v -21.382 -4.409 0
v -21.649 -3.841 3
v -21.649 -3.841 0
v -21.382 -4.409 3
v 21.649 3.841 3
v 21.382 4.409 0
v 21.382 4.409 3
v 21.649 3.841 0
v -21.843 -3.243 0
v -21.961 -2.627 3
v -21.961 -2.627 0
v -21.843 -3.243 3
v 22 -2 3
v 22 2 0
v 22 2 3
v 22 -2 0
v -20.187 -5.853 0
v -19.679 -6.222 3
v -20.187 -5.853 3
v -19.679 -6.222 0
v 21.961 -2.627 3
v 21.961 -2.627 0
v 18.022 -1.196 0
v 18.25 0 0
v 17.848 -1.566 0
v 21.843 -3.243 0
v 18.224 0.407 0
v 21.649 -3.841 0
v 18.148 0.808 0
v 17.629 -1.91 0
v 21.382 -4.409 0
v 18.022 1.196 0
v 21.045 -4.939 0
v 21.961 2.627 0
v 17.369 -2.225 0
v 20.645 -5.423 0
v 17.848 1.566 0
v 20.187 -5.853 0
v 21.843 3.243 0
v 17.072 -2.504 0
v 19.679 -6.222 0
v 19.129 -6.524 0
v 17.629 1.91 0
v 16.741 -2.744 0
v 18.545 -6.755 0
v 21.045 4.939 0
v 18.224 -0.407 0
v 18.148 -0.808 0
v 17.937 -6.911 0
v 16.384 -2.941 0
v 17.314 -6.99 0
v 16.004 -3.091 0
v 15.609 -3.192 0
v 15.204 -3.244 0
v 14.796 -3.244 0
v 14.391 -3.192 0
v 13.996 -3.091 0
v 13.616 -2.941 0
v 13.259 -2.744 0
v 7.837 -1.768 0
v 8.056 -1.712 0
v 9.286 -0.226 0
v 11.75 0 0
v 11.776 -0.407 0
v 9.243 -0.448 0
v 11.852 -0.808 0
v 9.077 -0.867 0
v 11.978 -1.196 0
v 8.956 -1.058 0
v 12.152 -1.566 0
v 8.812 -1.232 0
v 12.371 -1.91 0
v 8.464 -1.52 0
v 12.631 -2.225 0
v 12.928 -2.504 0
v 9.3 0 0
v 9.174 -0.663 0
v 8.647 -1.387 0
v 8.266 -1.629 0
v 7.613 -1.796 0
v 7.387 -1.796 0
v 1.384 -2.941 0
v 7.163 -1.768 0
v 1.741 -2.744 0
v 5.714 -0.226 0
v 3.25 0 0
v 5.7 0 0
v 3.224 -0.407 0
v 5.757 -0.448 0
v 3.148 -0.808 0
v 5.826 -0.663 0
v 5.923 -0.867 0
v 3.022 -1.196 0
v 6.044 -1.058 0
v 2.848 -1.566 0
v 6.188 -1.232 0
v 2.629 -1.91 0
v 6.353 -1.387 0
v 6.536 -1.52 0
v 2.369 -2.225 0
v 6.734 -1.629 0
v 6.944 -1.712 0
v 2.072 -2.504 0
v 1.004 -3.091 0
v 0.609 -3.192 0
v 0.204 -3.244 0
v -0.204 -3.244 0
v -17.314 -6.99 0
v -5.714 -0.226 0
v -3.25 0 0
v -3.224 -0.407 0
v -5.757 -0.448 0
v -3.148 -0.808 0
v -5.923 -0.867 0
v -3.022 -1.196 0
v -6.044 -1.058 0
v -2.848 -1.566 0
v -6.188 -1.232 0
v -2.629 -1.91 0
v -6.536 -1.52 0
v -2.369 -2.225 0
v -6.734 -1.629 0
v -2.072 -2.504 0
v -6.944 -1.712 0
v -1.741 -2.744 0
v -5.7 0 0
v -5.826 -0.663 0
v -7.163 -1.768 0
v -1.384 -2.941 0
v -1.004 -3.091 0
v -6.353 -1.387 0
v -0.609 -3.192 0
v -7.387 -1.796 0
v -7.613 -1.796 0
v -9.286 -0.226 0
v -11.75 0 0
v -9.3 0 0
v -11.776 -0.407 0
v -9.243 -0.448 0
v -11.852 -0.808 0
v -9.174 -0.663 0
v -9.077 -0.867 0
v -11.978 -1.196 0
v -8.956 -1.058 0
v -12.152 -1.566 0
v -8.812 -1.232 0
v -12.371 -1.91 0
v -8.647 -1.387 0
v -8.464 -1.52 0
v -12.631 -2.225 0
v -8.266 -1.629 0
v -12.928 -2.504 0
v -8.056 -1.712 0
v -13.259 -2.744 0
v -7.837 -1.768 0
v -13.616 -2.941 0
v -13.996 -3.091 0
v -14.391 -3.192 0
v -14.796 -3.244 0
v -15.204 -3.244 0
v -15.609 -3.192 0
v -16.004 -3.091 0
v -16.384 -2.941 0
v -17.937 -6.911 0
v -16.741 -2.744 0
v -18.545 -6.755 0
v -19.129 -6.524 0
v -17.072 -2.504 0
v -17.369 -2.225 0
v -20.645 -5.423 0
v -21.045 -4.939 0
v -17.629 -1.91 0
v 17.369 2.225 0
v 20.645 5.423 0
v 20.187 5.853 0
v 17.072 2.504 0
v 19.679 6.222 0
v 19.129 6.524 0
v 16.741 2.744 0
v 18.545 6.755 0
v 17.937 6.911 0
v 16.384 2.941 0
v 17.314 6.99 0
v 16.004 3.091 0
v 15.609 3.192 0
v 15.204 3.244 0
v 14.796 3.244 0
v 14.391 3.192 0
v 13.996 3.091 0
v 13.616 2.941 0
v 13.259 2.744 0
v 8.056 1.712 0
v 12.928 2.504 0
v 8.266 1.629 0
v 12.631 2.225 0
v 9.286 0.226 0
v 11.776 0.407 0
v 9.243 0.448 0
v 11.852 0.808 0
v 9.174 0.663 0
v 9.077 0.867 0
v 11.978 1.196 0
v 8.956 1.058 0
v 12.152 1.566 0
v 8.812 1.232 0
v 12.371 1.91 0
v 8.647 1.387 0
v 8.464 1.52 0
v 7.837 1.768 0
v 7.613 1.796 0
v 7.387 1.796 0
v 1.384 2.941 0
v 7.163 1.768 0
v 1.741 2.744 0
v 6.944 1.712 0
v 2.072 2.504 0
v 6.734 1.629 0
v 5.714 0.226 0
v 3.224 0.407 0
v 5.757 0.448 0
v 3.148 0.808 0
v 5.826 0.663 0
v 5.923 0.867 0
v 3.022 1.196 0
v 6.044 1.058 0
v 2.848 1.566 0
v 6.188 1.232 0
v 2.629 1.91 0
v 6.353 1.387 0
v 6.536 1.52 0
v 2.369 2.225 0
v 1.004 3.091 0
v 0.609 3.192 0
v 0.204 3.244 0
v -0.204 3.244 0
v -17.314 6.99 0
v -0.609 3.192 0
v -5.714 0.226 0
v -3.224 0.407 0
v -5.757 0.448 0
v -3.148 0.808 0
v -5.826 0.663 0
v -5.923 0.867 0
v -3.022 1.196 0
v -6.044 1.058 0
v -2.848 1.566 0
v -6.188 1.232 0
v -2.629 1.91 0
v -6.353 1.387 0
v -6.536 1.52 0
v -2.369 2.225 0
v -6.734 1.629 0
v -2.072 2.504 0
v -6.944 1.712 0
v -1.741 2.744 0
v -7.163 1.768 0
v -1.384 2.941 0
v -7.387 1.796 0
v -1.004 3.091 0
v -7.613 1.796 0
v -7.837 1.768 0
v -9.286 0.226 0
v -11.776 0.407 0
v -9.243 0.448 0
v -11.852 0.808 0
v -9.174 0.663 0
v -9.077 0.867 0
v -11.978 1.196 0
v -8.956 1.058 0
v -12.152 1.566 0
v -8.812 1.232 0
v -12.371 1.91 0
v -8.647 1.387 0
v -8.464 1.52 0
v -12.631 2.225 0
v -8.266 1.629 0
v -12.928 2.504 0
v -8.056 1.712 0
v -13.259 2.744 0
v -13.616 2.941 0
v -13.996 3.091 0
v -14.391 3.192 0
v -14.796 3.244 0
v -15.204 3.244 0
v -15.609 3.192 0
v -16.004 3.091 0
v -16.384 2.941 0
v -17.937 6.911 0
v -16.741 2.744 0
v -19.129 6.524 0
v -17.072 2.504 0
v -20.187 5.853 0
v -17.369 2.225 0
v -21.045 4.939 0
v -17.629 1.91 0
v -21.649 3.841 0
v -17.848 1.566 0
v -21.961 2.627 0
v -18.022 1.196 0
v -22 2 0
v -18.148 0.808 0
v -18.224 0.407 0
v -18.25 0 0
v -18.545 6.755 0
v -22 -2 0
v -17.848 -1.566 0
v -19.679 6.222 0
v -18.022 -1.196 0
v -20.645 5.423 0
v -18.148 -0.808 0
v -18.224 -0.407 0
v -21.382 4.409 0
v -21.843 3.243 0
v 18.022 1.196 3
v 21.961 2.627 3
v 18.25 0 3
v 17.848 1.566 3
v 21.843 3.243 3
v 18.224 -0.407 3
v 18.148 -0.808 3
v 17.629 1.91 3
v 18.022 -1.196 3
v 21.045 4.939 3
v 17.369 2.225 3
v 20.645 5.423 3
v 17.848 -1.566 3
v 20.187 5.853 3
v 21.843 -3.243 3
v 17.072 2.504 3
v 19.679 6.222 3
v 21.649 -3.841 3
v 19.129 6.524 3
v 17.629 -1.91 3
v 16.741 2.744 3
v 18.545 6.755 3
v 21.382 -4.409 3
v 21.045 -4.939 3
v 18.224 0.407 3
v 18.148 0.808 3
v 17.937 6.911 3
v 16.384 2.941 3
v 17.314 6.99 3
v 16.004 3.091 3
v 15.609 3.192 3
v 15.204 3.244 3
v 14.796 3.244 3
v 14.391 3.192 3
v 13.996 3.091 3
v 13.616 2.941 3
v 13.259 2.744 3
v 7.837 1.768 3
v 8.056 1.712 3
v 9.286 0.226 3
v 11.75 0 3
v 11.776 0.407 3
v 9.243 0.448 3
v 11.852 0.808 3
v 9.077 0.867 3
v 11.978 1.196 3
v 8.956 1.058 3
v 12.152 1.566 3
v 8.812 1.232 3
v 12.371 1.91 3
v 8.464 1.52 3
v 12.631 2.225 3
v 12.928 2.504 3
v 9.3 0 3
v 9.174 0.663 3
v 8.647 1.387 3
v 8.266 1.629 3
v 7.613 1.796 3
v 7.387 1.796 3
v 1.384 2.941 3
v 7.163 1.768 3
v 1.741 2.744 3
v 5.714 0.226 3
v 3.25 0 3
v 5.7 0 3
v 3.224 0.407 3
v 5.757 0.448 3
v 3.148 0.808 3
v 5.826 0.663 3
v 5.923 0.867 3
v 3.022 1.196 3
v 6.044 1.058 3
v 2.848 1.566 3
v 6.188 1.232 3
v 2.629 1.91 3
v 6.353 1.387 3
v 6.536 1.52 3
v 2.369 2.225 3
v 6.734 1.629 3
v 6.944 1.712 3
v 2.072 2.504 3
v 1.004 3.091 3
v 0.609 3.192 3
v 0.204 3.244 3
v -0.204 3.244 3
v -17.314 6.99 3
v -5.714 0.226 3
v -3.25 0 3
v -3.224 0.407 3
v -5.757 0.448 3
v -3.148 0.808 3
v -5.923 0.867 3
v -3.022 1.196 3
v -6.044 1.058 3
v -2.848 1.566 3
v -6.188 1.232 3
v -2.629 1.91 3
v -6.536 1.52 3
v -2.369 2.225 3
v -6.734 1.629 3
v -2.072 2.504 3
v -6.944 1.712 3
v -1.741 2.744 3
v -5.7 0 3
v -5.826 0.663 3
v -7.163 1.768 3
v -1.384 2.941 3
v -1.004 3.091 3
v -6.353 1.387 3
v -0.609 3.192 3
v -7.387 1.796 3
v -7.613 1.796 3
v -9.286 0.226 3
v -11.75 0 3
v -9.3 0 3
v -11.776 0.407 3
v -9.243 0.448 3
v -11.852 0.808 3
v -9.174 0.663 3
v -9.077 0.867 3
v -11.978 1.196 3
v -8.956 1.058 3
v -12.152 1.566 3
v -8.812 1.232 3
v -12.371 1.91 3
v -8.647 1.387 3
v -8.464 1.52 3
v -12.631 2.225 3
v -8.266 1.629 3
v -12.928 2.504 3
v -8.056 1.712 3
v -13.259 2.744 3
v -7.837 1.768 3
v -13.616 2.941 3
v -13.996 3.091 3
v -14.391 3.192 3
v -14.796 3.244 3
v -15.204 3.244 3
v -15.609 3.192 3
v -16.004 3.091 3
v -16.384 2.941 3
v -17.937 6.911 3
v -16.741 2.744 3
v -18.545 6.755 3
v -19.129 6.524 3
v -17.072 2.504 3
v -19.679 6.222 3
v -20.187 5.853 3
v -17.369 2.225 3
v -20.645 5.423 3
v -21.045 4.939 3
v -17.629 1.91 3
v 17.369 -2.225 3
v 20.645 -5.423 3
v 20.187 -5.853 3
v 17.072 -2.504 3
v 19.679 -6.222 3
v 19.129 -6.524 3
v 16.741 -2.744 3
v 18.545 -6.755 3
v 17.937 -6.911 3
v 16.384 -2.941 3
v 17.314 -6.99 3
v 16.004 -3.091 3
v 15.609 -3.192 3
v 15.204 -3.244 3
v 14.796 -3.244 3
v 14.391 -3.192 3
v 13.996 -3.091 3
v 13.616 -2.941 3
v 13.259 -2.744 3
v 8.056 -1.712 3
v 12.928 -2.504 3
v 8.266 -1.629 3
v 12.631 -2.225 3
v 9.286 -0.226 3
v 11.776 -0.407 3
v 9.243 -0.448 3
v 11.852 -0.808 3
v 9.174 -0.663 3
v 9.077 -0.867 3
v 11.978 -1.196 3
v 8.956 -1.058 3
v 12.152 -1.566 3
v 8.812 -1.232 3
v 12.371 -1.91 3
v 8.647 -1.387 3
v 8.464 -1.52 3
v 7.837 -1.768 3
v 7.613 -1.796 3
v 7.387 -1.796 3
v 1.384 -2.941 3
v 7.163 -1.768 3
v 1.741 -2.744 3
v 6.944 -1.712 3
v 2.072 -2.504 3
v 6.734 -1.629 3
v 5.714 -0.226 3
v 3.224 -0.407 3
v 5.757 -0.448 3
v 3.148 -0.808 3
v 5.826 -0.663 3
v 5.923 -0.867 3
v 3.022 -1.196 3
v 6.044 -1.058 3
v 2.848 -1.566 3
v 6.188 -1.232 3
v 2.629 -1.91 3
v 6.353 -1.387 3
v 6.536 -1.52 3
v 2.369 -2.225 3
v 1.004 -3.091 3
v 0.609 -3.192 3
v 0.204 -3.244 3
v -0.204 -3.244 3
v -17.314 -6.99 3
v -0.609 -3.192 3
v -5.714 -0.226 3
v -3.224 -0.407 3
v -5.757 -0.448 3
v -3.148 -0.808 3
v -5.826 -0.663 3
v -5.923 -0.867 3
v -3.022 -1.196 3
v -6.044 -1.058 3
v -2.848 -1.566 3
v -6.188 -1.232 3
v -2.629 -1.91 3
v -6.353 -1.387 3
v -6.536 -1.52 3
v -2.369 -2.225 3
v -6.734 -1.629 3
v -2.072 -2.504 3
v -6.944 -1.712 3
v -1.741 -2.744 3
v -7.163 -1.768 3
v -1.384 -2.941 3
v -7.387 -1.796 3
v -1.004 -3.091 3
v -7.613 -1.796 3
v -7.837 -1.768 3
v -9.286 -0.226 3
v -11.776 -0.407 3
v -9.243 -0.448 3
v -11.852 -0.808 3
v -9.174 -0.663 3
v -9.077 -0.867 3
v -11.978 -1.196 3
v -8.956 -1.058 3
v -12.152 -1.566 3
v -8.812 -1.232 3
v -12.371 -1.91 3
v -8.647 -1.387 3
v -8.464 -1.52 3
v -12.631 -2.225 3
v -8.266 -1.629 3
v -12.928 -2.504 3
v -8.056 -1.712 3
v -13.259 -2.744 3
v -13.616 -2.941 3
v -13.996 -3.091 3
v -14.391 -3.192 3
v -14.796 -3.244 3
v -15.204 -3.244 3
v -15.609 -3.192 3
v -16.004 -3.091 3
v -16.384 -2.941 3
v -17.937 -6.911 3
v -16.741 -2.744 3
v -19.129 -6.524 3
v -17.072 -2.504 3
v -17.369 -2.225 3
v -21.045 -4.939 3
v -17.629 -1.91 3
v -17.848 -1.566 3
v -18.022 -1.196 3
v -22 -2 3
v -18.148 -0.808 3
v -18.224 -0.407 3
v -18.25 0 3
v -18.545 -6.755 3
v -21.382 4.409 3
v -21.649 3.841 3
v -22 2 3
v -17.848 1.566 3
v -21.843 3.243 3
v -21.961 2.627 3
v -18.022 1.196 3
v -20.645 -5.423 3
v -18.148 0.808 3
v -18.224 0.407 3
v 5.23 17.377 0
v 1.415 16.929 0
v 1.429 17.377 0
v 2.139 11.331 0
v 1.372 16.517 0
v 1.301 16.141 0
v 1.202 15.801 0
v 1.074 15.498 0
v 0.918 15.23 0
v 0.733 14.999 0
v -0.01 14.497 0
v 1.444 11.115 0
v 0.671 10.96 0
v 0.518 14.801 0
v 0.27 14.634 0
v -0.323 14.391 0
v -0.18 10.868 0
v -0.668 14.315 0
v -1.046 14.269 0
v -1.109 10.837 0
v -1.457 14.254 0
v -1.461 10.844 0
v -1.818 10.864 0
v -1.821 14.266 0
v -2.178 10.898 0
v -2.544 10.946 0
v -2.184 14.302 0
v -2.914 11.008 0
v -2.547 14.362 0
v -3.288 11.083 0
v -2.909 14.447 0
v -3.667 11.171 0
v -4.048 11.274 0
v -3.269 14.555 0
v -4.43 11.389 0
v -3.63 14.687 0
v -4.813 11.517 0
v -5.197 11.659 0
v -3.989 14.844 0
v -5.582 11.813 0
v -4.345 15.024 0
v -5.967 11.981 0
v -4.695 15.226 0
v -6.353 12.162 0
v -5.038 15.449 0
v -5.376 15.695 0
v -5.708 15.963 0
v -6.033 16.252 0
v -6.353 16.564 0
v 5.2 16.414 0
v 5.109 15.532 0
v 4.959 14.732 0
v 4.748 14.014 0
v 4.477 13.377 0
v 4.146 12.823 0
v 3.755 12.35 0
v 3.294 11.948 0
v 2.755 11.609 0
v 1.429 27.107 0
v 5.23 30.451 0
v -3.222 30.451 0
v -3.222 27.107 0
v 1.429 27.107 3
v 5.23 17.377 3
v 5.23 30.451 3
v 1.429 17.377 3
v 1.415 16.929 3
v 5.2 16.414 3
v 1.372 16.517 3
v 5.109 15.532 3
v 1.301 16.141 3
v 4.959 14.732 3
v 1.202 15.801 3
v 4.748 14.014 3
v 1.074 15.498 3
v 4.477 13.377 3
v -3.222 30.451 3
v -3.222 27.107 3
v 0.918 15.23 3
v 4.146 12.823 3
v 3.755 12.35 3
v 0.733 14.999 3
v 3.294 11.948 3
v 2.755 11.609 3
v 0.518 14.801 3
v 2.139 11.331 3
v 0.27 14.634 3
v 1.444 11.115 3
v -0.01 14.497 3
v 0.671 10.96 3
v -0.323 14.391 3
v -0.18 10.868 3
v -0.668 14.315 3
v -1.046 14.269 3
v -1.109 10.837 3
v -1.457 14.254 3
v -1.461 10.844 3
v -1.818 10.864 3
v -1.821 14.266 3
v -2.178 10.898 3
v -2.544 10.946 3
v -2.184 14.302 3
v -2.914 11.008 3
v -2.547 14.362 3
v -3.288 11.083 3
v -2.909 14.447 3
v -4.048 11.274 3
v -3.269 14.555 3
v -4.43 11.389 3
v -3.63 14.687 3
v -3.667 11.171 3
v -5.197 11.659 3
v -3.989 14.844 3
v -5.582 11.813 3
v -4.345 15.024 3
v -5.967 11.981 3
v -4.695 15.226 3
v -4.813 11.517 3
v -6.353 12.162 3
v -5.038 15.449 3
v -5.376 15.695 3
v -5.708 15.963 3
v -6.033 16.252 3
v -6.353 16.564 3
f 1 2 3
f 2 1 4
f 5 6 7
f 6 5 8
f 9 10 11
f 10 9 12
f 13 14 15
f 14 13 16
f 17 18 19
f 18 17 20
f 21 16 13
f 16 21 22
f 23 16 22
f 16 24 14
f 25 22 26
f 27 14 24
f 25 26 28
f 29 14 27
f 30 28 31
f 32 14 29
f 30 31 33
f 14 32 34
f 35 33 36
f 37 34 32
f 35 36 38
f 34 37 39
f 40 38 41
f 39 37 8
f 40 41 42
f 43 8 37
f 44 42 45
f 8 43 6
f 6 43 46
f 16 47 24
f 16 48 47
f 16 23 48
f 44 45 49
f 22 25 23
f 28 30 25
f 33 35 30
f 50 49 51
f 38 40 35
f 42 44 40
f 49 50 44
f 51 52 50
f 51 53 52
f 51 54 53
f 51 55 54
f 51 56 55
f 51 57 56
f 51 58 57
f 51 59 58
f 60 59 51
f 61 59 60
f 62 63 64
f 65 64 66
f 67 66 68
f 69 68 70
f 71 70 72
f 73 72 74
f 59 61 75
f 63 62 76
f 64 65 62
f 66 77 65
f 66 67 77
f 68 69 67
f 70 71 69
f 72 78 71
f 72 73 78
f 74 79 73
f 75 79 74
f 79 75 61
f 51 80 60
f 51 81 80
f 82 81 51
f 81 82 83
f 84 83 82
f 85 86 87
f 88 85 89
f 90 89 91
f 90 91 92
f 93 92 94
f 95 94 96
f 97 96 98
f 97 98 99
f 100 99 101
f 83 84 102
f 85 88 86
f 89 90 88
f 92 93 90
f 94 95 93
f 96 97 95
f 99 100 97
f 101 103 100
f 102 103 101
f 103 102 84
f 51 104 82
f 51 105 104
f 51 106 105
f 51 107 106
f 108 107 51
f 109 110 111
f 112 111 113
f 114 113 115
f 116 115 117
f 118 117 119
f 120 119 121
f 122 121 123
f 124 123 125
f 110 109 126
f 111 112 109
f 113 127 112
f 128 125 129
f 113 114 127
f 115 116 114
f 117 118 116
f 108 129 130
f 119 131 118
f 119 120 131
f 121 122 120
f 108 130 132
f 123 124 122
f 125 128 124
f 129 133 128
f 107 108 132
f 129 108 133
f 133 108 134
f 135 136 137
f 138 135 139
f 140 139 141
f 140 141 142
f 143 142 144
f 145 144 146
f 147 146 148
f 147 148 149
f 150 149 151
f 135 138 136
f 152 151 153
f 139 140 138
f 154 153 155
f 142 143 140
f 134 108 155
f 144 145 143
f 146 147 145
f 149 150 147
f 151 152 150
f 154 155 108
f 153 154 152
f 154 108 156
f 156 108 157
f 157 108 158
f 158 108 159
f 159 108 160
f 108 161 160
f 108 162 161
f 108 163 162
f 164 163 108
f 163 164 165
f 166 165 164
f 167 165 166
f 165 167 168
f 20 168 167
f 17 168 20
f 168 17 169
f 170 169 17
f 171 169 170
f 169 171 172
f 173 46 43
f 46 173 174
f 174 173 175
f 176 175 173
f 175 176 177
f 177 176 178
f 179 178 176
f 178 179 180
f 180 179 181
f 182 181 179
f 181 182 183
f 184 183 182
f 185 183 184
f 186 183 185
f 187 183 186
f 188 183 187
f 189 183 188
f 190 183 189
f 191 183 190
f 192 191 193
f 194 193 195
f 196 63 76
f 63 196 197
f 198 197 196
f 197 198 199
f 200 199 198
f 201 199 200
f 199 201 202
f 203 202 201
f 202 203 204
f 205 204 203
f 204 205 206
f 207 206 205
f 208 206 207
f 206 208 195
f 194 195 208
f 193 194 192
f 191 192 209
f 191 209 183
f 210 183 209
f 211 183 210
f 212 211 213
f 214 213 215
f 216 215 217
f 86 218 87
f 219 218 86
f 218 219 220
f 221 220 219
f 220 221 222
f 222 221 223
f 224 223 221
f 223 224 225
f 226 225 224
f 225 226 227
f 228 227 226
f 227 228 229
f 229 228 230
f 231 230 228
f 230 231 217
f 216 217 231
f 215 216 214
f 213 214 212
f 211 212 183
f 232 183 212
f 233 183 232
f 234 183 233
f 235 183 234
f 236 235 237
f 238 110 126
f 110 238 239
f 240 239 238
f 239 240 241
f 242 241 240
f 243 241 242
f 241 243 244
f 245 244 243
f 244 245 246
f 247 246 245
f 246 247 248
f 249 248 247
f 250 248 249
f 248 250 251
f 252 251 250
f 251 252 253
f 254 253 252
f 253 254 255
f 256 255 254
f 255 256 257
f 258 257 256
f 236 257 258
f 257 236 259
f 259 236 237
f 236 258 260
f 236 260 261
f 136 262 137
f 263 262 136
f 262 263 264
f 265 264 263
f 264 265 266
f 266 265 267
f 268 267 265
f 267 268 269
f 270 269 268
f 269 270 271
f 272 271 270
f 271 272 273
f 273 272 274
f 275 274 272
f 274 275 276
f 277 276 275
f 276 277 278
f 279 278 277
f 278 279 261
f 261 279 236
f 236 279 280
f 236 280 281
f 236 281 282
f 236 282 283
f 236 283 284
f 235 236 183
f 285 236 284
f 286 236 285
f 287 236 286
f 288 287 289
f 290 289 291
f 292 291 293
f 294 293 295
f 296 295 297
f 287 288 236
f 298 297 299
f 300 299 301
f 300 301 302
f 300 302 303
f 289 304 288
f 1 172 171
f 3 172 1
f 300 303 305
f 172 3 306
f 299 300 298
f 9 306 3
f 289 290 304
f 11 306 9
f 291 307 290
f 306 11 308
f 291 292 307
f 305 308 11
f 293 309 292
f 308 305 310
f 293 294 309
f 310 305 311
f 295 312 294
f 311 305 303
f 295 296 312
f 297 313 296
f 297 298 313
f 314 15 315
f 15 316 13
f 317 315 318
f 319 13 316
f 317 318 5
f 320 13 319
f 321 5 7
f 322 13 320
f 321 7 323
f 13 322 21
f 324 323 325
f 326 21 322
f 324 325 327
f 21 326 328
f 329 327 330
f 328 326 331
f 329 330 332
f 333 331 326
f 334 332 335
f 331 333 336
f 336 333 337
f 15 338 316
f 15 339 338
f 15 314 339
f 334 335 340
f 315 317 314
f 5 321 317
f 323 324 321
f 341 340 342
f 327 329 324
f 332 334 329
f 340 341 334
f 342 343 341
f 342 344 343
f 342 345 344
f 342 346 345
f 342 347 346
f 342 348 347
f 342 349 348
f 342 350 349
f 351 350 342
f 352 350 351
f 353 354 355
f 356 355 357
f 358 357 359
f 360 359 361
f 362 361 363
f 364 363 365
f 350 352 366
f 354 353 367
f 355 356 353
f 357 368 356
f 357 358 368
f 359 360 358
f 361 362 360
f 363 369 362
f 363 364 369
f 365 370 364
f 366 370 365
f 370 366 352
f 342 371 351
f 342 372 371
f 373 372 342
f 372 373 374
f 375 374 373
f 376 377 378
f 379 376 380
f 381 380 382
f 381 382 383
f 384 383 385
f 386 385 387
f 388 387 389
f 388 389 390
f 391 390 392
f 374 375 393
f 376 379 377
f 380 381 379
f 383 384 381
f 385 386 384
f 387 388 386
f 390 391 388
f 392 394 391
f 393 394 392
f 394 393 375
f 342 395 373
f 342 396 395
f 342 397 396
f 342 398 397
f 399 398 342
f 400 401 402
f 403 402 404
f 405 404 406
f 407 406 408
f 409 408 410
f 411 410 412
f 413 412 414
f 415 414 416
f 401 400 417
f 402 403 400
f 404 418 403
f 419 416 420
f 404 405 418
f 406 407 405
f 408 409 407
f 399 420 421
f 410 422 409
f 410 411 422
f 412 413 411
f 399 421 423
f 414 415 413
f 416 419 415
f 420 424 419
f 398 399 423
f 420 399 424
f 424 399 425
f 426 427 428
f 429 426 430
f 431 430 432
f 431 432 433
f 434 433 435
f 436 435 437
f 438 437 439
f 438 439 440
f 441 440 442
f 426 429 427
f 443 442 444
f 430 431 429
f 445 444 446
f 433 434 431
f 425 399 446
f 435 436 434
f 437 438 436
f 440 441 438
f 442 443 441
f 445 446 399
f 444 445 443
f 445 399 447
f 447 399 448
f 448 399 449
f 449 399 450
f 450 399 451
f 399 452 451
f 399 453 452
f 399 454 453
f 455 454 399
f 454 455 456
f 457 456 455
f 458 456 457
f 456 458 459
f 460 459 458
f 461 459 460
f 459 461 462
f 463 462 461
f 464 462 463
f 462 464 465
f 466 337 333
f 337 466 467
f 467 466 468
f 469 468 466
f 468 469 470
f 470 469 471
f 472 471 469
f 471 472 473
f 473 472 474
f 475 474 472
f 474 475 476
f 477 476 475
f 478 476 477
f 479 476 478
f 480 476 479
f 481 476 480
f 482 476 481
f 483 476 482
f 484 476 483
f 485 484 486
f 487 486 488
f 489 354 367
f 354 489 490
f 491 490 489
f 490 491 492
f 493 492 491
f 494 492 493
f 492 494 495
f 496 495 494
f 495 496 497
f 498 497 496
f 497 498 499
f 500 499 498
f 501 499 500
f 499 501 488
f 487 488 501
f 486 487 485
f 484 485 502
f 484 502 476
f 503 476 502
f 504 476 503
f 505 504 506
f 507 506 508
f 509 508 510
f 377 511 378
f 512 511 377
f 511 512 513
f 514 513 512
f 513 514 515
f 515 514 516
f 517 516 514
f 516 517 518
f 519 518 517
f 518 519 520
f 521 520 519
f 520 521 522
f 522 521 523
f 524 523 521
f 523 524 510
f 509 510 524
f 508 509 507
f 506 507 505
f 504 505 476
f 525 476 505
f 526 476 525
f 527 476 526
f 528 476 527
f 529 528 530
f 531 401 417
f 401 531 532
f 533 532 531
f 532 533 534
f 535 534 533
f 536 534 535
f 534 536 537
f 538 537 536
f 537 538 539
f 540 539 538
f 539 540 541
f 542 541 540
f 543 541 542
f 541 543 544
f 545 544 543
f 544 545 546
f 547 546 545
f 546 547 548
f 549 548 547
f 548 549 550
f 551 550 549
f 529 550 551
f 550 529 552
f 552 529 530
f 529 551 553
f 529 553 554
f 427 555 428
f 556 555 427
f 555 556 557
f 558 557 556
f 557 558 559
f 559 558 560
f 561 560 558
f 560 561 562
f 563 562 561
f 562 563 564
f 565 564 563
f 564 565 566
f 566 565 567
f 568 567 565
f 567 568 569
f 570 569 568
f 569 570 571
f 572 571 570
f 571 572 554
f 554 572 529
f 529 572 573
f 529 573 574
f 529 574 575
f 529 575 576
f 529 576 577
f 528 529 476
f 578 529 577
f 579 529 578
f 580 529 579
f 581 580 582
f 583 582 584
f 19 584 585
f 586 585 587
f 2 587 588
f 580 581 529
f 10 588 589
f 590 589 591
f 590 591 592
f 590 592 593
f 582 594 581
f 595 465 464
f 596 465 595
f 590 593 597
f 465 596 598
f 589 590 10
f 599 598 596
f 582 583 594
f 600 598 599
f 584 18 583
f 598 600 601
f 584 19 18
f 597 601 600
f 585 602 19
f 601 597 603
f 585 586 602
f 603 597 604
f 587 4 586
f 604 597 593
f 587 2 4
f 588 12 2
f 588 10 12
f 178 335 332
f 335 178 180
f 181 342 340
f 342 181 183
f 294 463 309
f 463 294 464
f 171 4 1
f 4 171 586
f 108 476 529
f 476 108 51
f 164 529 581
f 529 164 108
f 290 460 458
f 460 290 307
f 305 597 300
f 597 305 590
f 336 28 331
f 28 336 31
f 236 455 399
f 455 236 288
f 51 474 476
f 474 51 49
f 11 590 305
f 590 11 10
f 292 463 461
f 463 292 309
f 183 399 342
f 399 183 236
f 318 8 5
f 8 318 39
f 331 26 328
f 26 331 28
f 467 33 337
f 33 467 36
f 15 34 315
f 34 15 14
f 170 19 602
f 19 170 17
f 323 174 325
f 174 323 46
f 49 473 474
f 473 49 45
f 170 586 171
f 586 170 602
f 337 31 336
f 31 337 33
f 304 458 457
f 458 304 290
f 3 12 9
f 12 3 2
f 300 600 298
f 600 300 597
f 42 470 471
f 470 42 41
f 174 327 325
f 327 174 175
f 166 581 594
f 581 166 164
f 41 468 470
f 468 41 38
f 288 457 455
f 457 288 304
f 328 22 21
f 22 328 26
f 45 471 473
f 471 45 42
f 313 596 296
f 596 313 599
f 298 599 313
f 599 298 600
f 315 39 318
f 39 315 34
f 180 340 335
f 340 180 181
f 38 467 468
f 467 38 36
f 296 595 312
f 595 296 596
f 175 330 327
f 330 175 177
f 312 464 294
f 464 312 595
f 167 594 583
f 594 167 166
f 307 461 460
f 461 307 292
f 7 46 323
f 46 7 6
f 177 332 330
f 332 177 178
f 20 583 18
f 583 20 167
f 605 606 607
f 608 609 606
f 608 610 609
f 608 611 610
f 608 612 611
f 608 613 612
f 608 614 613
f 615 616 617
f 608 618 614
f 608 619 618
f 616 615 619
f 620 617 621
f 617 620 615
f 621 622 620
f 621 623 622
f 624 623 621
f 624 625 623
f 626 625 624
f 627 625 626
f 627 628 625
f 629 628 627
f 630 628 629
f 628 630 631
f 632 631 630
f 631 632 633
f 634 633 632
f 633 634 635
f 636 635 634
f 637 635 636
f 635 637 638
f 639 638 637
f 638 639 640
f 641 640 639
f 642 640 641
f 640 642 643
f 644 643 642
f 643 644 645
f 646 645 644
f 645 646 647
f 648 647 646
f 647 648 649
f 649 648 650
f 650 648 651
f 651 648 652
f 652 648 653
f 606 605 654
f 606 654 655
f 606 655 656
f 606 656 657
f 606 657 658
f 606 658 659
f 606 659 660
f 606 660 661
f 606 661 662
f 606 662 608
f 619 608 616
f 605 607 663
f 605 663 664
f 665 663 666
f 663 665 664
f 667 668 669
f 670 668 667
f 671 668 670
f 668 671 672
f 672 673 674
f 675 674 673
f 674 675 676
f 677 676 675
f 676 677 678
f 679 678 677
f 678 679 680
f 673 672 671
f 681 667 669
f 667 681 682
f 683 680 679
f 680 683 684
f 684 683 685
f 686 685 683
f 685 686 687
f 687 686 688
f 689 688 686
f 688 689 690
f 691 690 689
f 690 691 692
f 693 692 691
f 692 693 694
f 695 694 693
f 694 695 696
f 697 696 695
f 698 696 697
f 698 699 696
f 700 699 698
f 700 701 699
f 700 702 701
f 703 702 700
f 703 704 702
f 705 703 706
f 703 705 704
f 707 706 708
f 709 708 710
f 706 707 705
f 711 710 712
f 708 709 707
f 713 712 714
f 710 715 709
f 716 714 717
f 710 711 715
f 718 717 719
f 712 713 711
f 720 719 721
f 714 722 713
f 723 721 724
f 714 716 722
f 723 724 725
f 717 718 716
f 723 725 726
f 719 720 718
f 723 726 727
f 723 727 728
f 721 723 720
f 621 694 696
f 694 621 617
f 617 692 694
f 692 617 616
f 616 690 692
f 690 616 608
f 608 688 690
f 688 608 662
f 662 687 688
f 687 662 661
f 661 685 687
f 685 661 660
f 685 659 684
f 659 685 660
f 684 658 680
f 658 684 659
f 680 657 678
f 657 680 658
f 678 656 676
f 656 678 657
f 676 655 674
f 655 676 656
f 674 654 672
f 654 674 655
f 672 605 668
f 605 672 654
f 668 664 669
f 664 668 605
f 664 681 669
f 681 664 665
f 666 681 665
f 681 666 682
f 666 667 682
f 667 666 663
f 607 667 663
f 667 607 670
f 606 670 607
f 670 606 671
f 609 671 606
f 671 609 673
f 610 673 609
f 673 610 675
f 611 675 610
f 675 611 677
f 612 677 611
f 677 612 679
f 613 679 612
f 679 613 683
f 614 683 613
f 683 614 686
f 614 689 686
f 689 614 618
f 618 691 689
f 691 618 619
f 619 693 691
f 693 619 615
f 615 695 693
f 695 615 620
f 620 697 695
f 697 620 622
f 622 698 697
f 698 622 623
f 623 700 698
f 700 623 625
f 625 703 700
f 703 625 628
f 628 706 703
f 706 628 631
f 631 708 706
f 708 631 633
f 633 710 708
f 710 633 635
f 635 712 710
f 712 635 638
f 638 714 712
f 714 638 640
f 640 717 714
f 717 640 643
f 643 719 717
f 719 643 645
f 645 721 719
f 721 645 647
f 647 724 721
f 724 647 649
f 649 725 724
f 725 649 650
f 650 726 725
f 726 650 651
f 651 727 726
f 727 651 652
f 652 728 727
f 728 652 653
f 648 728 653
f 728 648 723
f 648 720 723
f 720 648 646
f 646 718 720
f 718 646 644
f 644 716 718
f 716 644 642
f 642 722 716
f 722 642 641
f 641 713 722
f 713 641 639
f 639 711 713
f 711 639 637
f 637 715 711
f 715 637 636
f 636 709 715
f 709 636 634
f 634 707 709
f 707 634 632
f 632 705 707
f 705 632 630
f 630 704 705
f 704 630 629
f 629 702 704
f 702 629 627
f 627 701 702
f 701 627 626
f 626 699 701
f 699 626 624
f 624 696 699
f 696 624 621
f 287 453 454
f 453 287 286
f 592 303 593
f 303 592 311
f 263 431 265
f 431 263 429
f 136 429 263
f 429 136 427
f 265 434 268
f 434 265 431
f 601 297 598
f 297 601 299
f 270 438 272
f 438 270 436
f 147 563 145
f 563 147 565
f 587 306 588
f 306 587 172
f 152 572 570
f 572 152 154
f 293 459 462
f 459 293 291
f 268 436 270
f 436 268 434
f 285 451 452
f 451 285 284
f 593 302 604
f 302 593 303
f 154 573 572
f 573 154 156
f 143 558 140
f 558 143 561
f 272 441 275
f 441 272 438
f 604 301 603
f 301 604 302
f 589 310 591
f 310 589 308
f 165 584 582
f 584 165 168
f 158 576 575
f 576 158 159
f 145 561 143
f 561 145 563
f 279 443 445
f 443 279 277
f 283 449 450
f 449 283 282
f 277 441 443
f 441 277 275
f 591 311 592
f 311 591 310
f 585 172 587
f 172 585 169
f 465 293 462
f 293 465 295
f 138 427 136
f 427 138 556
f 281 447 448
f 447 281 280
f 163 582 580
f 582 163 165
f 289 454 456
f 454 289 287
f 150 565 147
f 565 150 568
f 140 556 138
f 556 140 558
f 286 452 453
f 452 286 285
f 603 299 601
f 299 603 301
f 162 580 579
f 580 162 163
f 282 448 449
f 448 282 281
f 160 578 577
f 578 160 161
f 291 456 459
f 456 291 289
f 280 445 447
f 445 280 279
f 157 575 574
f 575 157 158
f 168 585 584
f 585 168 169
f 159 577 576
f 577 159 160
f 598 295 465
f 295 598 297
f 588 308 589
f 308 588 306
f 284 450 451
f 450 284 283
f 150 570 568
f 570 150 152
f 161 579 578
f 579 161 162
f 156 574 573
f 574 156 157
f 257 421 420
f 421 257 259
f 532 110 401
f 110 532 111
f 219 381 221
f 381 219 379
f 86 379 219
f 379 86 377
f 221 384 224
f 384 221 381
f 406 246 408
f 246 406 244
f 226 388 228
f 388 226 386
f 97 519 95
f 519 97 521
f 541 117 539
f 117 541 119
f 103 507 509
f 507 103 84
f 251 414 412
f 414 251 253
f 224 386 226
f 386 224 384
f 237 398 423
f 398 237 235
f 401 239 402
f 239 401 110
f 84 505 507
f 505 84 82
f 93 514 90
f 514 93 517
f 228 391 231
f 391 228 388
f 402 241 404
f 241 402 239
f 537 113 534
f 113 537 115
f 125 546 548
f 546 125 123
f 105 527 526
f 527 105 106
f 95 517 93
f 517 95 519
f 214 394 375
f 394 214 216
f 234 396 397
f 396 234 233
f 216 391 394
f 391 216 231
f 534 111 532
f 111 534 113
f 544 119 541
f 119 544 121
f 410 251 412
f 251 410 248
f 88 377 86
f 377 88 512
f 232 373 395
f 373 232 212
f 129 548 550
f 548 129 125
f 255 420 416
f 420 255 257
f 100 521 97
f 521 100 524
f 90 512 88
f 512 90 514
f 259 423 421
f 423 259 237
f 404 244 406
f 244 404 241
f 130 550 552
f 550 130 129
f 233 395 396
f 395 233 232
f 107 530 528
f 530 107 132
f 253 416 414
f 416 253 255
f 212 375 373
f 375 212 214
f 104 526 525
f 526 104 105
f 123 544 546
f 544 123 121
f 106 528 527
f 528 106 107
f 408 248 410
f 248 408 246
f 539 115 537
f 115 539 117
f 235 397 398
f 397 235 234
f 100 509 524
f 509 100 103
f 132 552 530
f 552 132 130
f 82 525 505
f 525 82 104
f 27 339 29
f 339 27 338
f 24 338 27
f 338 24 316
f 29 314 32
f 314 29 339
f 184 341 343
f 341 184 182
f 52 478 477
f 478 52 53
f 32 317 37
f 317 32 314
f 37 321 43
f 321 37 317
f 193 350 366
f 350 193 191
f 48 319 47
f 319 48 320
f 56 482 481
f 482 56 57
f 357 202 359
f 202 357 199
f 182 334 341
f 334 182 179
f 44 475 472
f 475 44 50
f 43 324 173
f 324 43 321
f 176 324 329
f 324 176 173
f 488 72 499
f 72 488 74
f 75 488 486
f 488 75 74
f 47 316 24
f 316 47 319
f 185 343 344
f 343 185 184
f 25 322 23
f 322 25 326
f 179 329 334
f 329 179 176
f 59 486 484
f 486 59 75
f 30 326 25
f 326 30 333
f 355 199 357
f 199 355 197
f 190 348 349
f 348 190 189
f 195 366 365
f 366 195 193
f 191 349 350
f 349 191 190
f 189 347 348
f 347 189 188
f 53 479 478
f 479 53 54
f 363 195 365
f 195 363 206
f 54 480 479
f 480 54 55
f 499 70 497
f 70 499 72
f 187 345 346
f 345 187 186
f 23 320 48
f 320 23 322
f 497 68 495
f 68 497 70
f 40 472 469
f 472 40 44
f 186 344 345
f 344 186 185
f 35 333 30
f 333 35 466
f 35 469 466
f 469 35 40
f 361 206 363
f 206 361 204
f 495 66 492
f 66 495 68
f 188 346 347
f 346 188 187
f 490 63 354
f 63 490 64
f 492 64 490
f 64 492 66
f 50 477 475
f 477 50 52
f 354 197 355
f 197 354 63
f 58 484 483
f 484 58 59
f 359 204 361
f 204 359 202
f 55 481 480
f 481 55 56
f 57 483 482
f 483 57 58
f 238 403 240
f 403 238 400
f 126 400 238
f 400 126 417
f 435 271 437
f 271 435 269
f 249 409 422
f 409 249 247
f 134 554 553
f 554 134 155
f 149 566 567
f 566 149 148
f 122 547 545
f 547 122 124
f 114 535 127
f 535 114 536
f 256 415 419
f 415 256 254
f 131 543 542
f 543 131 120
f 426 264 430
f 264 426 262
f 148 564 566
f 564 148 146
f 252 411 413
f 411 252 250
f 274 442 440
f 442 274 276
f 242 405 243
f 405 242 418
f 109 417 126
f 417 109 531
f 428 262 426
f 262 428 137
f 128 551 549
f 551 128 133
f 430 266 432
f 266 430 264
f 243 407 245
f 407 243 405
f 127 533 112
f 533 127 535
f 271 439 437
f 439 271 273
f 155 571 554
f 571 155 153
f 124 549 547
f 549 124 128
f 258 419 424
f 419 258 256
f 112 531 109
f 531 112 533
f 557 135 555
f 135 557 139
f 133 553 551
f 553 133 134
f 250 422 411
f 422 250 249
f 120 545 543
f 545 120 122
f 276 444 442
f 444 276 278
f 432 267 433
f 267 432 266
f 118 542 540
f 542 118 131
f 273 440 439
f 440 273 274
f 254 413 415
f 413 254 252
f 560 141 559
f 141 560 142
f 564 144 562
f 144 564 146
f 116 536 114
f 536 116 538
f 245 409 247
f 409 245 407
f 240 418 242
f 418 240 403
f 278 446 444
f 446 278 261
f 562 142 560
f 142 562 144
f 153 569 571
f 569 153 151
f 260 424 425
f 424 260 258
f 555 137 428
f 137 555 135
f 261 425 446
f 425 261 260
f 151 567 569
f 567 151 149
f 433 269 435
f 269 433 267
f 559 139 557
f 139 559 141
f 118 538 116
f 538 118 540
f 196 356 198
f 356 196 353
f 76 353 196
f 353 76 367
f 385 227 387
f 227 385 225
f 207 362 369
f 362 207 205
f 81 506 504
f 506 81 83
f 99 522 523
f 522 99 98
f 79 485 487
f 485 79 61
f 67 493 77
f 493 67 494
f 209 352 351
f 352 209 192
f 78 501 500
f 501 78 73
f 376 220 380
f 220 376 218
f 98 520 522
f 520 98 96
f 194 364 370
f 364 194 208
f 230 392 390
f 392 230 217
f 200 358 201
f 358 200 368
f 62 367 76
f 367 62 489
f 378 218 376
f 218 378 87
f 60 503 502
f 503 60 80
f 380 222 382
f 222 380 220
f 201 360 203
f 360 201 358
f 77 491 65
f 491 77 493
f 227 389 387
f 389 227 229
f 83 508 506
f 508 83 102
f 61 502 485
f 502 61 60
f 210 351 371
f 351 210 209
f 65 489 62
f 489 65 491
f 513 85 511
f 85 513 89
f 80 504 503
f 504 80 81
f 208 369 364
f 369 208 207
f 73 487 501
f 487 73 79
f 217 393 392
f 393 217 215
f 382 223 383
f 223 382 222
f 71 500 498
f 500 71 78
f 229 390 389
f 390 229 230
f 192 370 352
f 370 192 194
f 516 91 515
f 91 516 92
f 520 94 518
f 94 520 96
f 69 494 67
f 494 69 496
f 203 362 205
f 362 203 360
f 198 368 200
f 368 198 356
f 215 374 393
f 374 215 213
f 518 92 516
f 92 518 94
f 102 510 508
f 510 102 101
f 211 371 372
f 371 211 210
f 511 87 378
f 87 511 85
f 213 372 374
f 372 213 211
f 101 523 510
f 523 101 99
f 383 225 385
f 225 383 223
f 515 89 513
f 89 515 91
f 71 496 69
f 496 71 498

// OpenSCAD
$fn = 50;


difference() {
	union() {
		hull() {
			translate(v = [-17.0000000000, 2.0000000000, 0]) {
				cylinder(h = 3, r = 5);
			}
			translate(v = [17.0000000000, 2.0000000000, 0]) {
				cylinder(h = 3, r = 5);
			}
			translate(v = [-17.0000000000, -2.0000000000, 0]) {
				cylinder(h = 3, r = 5);
			}
			translate(v = [17.0000000000, -2.0000000000, 0]) {
				cylinder(h = 3, r = 5);
			}
		}
		translate(v = [0, 30.0000000000, 0]) {
			linear_extrude(height = 3) {
				text(font = "DejaVu Sans Mono:style=Bold", halign = "center", size = 19.0000000000, text = "J", valign = "top");
			}
		}
	}
	union() {
		translate(v = [-15.0000000000, 0.0000000000, 0]) {
			translate(v = [0, 0, -100]) {
				cylinder(h = 200, r = 3.2500000000);
			}
		}
		translate(v = [0, 0, -100]) {
			cylinder(h = 200, r = 3.2500000000);
		}
		translate(v = [15.0000000000, 0.0000000000, 0]) {
			translate(v = [0, 0, -100]) {
				cylinder(h = 200, r = 3.2500000000);
			}
		}
		translate(v = [-15.0000000000, 0.0000000000, 0]) {
			translate(v = [0, 0, -100]) {
				cylinder(h = 200, r = 1.8000000000);
			}
		}
		translate(v = [-7.5000000000, 0.0000000000, 0]) {
			translate(v = [0, 0, -100]) {
				cylinder(h = 200, r = 1.8000000000);
			}
		}
		translate(v = [0, 0, -100]) {
			cylinder(h = 200, r = 1.8000000000);
		}
		translate(v = [7.5000000000, 0.0000000000, 0]) {
			translate(v = [0, 0, -100]) {
				cylinder(h = 200, r = 1.8000000000);
			}
		}
		translate(v = [15.0000000000, 0.0000000000, 0]) {
			translate(v = [0, 0, -100]) {
				cylinder(h = 200, r = 1.8000000000);
			}
		}
	}
}
